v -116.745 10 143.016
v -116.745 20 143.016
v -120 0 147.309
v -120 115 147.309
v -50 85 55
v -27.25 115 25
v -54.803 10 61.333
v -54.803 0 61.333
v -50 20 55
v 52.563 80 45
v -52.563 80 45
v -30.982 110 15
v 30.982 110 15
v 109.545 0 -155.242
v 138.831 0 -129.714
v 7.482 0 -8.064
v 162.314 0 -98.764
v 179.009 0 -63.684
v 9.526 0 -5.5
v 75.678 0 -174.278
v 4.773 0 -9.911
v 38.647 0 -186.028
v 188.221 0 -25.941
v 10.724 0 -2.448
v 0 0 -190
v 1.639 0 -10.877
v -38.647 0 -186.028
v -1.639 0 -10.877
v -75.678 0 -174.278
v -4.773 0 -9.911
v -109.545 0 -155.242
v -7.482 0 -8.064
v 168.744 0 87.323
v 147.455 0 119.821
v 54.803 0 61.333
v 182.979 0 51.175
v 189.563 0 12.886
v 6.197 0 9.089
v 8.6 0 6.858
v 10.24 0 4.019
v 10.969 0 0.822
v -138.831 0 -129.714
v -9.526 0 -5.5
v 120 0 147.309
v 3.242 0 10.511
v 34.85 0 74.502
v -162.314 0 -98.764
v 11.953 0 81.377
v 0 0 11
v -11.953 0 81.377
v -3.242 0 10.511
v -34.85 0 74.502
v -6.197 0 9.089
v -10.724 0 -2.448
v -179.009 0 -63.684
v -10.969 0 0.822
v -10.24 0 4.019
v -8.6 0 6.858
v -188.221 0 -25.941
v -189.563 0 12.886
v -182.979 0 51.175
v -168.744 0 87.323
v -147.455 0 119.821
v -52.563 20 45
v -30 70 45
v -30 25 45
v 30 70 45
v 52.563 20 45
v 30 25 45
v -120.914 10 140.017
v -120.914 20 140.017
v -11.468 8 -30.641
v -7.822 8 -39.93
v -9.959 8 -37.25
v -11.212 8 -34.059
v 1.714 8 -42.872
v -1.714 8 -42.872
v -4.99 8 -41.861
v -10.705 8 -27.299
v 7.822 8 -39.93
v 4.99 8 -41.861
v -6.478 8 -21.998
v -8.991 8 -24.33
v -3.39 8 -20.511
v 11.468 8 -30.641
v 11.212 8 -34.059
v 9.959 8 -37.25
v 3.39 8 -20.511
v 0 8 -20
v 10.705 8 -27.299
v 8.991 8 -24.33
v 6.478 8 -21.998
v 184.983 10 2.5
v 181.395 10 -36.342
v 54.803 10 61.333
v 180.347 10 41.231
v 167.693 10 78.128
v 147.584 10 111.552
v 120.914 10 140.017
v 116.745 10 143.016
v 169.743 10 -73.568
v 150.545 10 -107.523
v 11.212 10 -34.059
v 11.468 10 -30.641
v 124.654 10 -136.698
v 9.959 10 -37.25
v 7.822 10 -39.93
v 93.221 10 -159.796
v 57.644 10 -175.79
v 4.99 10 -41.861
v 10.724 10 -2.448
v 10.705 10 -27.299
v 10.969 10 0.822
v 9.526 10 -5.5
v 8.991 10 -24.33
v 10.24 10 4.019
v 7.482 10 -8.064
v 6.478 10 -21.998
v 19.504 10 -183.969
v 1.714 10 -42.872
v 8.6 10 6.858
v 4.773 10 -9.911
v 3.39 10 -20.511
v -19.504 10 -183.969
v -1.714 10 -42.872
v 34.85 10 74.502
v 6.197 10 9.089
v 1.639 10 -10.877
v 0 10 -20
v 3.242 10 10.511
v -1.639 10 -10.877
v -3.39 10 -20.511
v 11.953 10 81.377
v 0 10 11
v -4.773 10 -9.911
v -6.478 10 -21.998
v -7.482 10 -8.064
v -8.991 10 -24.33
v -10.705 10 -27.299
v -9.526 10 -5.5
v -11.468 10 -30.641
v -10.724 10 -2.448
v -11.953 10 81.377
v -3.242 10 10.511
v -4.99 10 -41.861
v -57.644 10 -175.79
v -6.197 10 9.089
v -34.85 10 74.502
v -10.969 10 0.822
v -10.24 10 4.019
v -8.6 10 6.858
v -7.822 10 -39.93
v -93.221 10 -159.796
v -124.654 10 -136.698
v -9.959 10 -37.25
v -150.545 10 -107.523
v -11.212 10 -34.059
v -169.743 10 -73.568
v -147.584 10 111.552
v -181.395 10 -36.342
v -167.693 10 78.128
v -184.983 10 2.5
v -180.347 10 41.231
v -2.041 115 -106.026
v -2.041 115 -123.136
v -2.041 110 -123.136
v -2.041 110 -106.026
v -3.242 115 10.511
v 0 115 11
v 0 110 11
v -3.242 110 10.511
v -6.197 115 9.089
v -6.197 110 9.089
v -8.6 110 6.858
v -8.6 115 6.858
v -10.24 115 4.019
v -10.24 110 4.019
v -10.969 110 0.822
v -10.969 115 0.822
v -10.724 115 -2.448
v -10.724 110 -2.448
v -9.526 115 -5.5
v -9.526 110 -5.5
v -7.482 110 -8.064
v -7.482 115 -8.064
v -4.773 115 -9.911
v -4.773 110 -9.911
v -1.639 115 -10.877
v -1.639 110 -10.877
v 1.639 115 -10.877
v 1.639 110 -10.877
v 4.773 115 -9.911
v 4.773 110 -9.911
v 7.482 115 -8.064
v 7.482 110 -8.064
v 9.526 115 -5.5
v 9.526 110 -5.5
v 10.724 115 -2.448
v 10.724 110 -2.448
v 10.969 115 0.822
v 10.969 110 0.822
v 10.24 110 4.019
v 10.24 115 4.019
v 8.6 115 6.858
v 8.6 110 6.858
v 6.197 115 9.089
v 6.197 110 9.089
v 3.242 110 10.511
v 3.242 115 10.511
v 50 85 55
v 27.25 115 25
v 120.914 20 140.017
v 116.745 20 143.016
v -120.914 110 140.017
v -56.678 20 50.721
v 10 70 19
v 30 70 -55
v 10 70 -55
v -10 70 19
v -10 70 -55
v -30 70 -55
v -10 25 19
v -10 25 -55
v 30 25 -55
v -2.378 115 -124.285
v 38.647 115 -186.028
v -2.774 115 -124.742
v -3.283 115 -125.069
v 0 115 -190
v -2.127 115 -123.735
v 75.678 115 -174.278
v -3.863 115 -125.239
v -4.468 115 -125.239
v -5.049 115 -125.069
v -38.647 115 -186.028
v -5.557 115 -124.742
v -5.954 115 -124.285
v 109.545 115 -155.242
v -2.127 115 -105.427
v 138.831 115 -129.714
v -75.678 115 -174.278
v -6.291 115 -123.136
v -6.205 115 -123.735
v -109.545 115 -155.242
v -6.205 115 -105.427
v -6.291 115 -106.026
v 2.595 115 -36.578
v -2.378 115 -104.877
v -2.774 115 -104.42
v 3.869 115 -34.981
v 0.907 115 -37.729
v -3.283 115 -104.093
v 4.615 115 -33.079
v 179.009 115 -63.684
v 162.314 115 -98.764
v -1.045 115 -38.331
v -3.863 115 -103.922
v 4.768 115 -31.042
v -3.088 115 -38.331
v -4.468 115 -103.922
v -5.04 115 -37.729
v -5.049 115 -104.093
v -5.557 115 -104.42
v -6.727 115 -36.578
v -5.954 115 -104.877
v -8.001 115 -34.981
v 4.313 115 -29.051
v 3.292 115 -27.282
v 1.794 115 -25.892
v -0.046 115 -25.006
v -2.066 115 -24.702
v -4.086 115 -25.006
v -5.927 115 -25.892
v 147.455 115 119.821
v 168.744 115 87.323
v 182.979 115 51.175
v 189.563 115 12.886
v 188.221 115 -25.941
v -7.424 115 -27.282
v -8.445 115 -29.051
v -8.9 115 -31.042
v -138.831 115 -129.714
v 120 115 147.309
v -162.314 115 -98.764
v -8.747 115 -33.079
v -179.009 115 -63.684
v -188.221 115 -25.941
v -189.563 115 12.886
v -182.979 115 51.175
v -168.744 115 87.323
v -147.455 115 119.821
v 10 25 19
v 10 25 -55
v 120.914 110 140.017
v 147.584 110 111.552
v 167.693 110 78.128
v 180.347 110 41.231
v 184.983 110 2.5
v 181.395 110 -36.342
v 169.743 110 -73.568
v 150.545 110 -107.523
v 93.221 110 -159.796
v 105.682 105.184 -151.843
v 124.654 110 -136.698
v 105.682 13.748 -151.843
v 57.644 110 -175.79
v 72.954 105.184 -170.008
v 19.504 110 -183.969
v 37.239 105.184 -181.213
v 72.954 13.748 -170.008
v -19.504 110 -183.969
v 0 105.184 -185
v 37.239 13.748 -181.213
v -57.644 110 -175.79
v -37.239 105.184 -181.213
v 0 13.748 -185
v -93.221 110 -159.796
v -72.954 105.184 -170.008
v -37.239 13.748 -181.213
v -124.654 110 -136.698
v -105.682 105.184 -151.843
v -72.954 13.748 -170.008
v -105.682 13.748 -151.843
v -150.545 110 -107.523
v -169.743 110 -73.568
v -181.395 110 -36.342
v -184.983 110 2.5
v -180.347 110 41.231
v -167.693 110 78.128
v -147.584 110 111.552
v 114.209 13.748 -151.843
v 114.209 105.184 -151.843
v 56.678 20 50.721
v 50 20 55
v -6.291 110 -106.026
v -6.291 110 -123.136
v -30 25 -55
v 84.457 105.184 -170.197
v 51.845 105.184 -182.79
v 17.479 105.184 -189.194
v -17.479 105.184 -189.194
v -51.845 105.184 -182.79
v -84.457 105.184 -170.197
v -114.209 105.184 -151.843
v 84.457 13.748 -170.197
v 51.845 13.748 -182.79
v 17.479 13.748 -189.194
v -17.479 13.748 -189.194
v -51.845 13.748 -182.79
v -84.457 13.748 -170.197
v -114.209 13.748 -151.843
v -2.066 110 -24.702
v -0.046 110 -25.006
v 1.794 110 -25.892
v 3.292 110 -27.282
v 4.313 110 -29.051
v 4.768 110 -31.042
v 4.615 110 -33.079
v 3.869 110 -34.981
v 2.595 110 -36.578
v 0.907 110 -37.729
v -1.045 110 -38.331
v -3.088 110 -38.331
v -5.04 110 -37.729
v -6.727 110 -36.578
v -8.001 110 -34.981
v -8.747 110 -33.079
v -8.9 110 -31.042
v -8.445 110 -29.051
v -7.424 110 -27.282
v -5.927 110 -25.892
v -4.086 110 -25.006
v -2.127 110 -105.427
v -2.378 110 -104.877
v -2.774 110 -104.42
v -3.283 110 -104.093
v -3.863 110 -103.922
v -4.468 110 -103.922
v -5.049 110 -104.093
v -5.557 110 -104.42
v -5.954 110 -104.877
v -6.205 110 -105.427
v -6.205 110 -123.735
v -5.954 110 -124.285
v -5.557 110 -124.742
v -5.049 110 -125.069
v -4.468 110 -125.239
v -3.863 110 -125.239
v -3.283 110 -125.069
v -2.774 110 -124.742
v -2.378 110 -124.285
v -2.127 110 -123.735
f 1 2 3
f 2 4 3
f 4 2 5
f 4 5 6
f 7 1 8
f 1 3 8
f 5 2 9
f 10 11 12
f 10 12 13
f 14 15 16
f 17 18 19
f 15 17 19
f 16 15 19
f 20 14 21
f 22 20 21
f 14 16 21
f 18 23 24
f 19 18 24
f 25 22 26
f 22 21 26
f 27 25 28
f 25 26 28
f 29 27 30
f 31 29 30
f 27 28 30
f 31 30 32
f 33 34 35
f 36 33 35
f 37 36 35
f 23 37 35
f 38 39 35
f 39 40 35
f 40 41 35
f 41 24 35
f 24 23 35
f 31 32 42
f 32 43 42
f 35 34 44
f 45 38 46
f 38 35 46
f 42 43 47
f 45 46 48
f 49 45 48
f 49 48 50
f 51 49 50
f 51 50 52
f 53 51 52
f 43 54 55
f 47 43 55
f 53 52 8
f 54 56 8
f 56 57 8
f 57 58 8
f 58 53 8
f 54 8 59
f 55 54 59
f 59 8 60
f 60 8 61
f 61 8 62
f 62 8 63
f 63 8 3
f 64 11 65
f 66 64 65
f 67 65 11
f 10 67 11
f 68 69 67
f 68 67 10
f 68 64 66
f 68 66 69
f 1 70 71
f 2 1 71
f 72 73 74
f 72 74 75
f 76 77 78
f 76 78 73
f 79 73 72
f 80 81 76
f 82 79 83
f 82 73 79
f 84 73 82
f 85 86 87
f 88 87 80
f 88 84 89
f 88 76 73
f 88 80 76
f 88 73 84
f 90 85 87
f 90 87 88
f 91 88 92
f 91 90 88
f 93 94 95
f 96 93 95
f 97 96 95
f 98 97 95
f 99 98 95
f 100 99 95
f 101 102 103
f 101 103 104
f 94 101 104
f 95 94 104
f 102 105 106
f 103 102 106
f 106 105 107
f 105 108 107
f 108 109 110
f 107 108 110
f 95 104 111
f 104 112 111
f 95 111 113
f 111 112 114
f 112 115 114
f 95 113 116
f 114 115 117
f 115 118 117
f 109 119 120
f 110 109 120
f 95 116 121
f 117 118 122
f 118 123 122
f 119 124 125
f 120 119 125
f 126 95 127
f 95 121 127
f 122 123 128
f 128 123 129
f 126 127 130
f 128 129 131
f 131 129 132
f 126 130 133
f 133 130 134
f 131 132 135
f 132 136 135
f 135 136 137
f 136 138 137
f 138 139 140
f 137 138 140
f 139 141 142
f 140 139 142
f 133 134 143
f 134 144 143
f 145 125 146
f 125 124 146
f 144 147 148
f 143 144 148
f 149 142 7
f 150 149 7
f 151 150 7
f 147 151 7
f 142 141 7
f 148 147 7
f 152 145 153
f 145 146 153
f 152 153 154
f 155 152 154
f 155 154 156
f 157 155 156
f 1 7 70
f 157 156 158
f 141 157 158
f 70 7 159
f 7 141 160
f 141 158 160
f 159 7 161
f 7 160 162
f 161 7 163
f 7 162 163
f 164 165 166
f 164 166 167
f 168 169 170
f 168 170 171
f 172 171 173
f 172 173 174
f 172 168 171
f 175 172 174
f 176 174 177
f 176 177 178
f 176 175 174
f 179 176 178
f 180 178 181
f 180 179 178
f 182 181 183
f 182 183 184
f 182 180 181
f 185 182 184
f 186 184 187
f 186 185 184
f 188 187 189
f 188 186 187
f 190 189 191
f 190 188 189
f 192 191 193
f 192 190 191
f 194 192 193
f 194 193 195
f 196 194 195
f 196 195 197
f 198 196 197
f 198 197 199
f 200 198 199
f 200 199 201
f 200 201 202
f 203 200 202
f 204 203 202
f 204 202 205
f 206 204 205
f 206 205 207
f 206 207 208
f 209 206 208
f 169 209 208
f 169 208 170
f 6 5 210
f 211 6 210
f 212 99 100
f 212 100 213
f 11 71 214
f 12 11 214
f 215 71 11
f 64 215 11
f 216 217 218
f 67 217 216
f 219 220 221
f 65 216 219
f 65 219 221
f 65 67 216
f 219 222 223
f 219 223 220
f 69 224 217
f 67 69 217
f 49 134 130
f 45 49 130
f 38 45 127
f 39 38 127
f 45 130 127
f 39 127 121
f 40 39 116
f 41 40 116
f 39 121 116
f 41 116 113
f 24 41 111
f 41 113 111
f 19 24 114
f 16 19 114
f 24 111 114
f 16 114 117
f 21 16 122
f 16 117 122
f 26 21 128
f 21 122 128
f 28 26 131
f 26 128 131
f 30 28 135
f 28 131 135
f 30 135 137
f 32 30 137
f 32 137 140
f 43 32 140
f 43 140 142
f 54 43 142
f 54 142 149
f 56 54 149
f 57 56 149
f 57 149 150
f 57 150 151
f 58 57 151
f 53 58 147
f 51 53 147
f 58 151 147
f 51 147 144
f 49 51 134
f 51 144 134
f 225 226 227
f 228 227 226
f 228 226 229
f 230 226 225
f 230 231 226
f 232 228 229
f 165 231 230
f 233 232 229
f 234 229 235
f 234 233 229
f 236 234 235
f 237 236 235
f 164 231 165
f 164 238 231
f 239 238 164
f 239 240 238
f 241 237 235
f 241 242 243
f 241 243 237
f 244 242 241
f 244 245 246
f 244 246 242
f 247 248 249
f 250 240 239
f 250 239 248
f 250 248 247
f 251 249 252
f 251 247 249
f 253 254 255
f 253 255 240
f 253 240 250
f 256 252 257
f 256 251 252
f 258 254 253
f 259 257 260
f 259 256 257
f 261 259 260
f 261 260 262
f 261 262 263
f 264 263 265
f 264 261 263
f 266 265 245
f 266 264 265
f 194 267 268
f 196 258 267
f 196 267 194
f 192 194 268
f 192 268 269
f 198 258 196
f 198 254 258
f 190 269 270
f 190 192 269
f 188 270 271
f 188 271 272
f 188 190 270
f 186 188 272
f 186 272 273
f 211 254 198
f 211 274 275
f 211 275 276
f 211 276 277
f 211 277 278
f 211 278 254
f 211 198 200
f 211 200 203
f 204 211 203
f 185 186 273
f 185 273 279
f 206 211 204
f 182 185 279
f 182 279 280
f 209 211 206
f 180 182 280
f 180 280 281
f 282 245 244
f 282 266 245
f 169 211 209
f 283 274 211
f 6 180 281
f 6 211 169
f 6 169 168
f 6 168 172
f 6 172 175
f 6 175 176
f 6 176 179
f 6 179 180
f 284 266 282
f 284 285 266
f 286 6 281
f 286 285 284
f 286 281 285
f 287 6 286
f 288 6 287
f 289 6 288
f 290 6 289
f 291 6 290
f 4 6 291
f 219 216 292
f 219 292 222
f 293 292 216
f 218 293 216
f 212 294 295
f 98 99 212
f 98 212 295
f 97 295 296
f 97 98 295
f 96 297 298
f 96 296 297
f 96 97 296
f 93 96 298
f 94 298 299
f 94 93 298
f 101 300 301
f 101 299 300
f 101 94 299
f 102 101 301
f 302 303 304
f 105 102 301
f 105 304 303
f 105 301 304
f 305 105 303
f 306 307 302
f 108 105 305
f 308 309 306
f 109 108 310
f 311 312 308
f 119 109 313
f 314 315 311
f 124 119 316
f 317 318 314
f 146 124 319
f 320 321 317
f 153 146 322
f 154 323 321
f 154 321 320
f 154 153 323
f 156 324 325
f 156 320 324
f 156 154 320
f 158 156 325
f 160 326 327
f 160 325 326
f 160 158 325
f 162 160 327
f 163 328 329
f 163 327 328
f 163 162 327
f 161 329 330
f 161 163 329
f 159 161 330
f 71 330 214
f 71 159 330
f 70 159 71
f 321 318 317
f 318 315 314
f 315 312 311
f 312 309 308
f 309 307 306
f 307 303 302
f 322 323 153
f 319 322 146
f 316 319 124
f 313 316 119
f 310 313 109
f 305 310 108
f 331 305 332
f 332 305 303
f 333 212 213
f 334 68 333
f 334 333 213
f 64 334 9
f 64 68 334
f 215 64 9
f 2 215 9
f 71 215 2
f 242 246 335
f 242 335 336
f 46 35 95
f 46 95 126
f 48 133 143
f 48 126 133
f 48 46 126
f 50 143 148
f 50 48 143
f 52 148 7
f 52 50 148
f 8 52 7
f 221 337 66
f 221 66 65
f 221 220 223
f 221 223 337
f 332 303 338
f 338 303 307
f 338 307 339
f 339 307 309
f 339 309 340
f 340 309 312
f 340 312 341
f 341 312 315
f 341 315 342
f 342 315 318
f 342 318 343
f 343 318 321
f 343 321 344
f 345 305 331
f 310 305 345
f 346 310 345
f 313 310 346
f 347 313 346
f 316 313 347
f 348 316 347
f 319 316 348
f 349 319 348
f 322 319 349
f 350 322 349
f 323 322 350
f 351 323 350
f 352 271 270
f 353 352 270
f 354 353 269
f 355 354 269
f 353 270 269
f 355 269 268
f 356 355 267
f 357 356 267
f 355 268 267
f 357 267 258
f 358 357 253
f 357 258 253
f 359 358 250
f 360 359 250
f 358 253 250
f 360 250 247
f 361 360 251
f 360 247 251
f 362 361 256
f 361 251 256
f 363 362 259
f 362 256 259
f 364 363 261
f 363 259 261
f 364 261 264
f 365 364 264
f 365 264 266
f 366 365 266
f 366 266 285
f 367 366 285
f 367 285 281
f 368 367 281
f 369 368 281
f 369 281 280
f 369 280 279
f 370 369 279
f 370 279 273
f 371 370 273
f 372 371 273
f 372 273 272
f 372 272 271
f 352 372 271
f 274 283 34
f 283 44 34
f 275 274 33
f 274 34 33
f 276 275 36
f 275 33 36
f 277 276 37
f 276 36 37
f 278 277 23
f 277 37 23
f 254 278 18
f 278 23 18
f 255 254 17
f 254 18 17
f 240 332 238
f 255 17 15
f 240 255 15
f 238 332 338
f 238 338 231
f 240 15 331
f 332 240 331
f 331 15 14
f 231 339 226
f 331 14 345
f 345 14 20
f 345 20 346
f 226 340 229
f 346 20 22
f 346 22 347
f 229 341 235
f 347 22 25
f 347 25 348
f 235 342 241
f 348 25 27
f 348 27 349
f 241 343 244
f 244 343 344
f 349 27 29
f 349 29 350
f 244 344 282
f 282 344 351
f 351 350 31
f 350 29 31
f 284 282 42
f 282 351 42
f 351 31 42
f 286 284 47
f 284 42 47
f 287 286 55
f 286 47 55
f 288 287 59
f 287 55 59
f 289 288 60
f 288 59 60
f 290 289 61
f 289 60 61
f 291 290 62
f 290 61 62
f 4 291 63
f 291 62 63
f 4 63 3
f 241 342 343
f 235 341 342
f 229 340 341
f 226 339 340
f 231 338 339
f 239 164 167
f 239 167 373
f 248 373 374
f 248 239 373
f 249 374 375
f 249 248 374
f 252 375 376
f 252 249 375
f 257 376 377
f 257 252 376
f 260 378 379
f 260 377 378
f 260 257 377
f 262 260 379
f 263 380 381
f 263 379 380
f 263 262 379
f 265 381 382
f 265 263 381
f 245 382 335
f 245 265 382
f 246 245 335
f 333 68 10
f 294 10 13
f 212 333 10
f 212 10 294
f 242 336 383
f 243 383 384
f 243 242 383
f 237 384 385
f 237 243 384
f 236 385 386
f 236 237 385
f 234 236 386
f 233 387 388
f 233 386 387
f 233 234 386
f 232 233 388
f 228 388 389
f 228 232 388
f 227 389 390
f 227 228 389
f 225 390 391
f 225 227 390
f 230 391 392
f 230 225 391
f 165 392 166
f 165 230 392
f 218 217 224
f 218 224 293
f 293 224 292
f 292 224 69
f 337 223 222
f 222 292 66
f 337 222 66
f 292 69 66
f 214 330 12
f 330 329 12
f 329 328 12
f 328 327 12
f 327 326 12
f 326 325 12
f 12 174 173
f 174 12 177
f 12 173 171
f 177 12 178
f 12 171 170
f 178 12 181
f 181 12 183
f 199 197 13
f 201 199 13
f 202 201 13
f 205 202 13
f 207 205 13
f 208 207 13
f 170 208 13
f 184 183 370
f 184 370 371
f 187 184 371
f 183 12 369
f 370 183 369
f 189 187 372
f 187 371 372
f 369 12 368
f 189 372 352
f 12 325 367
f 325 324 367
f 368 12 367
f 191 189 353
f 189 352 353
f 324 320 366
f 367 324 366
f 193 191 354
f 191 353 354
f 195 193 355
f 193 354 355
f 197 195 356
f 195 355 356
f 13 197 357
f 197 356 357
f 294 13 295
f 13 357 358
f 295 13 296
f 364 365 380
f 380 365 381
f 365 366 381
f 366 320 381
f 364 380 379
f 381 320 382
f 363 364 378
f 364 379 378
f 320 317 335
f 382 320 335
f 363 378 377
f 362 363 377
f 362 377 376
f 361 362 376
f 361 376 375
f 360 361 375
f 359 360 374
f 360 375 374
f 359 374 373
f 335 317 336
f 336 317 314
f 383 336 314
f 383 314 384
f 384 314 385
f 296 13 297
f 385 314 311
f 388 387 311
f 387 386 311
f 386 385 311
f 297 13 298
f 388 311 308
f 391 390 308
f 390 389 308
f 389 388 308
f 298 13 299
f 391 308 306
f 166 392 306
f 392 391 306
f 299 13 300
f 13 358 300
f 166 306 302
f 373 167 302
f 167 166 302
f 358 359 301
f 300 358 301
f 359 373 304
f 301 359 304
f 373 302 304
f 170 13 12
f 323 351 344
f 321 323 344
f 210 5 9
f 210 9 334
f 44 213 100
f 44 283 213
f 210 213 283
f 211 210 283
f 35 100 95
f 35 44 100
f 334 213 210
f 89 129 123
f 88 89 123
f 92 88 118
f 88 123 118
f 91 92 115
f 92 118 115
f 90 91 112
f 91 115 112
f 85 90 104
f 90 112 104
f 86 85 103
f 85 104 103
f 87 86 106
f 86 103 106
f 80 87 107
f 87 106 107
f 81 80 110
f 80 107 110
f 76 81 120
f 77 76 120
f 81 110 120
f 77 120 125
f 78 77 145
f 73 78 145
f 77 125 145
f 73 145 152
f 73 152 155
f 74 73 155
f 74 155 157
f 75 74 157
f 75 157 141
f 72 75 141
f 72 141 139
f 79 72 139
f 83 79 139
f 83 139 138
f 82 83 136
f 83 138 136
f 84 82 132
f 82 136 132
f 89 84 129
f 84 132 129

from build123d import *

# Parameters (mm, degrees)
SKETCH_1_R                = 190
EXTRUDE_1_DEPTH           = 10
SKETCH_2_R                = 11
CUT_EXTRUDE_1_DEPTH       = 10
CUT_EXTRUDE_2_DEPTH       = 10
CUT_EXTRUDE_3_DEPTH       = 10
SKETCH_5_R                = 11.5
CUT_EXTRUDE_4_DEPTH       = 2
EXTRUDE_2_DEPTH           = 100
EXTRUDE_3_DEPTH           = 5
CUT_EXTRUDE_START         = -5
SKETCH_11_R               = 11
CUT_EXTRUDE_7_DEPTH       = 5
SKETCH_12_W               = 100
SKETCH_12_H               = 115
EXTRUDE_4_DEPTH           = 5
EXTRUDE_5_DEPTH           = 115
CUT_EXTRUDE_8_DEPTH       = 289.487434735
SKETCH_15_W               = 110
SKETCH_15_H               = 10
CUT_EXTRUDE_9_DEPTH       = 23
SKETCH_16_W               = 110
SKETCH_16_H               = 10
CUT_EXTRUDE_10_DEPTH      = 23
EXTRUDE_6_DEPTH           = 10
SKETCH_18_R               = 10
EXTRUDE_7_DEPTH           = 100
SKETCH_20_W               = 40.15762627
SKETCH_20_H               = 37.957208392
EXTRUDE_8_DEPTH           = 20
CUT_EXTRUDE_11_DEPTH      = 70
SKETCH_22_W               = 6
SKETCH_22_H               = 39.800206828
SKETCH_24_R               = 10.715541735
EXTRUDE_9_DEPTH           = 50
SKETCH_25_R               = 8.111462828
CUT_EXTRUDE_13_DEPTH      = 1
FILLET_2_R                = 3
SKETCH_26_W               = 20.914862296
SKETCH_26_H               = 66.390296829
CUT_EXTRUDE_14_DEPTH      = 41
EXTRUDE_START             = -5
EXTRUDE_10_DEPTH          = 5
CUT_EXTRUDE_15_DEPTH      = 369.496652909
CUT_EXTRUDE_15_DEPTH_BACK = 369.496652909
SKETCH_28_W               = 81.996426071
SKETCH_28_H               = 91.436240801
EXTRUDE_11_DEPTH          = 142
SKETCH_30_W               = 61.807944975
SKETCH_30_H               = 65.134221846
EXTRUDE_12_DEPTH          = 5
FILLET_4_R                = 13
SKETCH_31_W               = 61.807944975
SKETCH_31_H               = 147
EXTRUDE_13_DEPTH          = 70
SKETCH_32_W               = 51.807944975
SKETCH_32_H               = 142
CUT_EXTRUDE_16_DEPTH      = 60
FILLET_5_R                = 13
FILLET_6_R                = 13
CUT_EXTRUDE_17_DEPTH      = 60
CUT_EXTRUDE_18_DEPTH      = 60
EXTRUDE_START_2           = -75
SKETCH_35_W               = 61.807944975
SKETCH_35_H               = 6.562212177
EXTRUDE_14_DEPTH          = 75
CUT_EXTRUDE_19_DEPTH      = 60
CUT_EXTRUDE_START_2       = 70
CUT_EXTRUDE_20_DEPTH      = 70
SKETCH_40_R               = 6.852948308
CUT_EXTRUDE_24_DEPTH      = 10
CHAMFER_1_SIZE            = 30
CHAMFER_2_SIZE            = 30
CUT_EXTRUDE_25_DEPTH      = 216
CUT_EXTRUDE_26_DEPTH      = 10
CUT_EXTRUDE_26_DEPTH_BACK = 20
SKETCH_42_W               = 161.925382199
SKETCH_42_H               = 10
SKETCH_43_W               = 20
SKETCH_43_H               = 45
EXTRUDE_15_DEPTH          = 100
SKETCH_44_W               = 60
SKETCH_44_H               = 45
EXTRUDE_16_DEPTH          = 26


# Read off the part's stored shape, not the designer's step: 圆顶1
with BuildPart() as part:
    # 草图1 → 凸台-拉伸1 (new body)
    with BuildSketch(Plane(origin=(0, 0, 0), x_dir=(1, 0, 0), z_dir=(0, 1, 0))):
        with Locations(Location((0, 0, 0), (0, 0, 270))):
            Circle(SKETCH_1_R)
    extrude(amount=EXTRUDE_1_DEPTH)

    # 草图2 → 切除-拉伸1 (cut)
    with BuildSketch(Plane(origin=(0, 10, 0), x_dir=(1, 0, 0), z_dir=(0, 1, 0))):
        with Locations(Location((0, 0, 0), (0, 0, 270))):
            Circle(SKETCH_2_R)
    extrude(amount=-CUT_EXTRUDE_1_DEPTH, mode=Mode.SUBTRACT)

    # 草图3 → 切除-拉伸2 (cut)
    with BuildSketch(Plane(origin=(0, 10, 0), x_dir=(1, 0, 0), z_dir=(0, 1, 0))):
        Polygon((-50, -50), (-120, -147.309198627), (120, -147.309198627), (50, -50), align=None)
    extrude(amount=-CUT_EXTRUDE_2_DEPTH, mode=Mode.SUBTRACT)

    # 草图4 → 切除-拉伸3 (cut)
    with BuildSketch(Plane(origin=(0, 10, 0), x_dir=(1, 0, 0), z_dir=(0, 1, 0))):
        Polygon((50, -50), (136.06201209, -169.637506124), (-54.476164161, -215.928987862), (-150.534220248, -169.637506124), (-120, -147.309198627), (-80.889727825, -92.940780863), align=None)
    extrude(amount=-CUT_EXTRUDE_3_DEPTH, mode=Mode.SUBTRACT)

    # 草图5 → 切除-拉伸4 (cut)
    with BuildSketch(Plane(origin=(0, 10, 0), x_dir=(1, 0, 0), z_dir=(0, 1, 0))):
        with Locations(Location((0, 31.5, 0), (0, 0, 270))):
            Circle(SKETCH_5_R)
    extrude(amount=-CUT_EXTRUDE_4_DEPTH, mode=Mode.SUBTRACT)

    # 草图9 → 凸台-拉伸2 (add)
    with BuildSketch(Plane(origin=(0, 10, 0), x_dir=(1, 0, 0), z_dir=(0, 1, 0))):
        with BuildLine():
            Line((50, -50), (120, -147.309198627))
            ThreePointArc((120, -147.309198627), (0, 190), (-120, -147.309198627))
            Line((-120, -147.309198627), (-50, -50))
            Line((-50, -50), (50, -50))
        make_face()
        with BuildLine():
            Line((52.56250687, -45), (120.913822869, -140.017311213))
            ThreePointArc((120.913822869, -140.017311213), (0, 185), (-120.913822869, -140.017311213))
            Line((-120.913822869, -140.017311213), (-52.56250687, -45))
            Line((-52.56250687, -45), (52.56250687, -45))
        make_face(mode=Mode.SUBTRACT)
    extrude(amount=EXTRUDE_2_DEPTH)

    # 草图10 → 凸台-拉伸3 (add)
    with BuildSketch(Plane(origin=(0, 110, 0), x_dir=(1, 0, 0), z_dir=(0, 1, 0))):
        with BuildLine():
            Line((-50, -50), (50, -50))
            Line((50, -50), (120, -147.309198627))
            ThreePointArc((120, -147.309198627), (0, 190), (-120, -147.309198627))
            Line((-120, -147.309198627), (-50, -50))
        make_face()
    extrude(amount=EXTRUDE_3_DEPTH)

    # 草图11 → 切除-拉伸7 (cut)
    with BuildSketch(Plane.XZ.offset(-110).offset(CUT_EXTRUDE_START)):
        with Locations(Location((0, 0, 0), (0, 0, 90))):
            Circle(SKETCH_11_R)
    extrude(amount=CUT_EXTRUDE_7_DEPTH, mode=Mode.SUBTRACT)

    # 草图12 → 凸台-拉伸4 (add)
    with BuildSketch(Plane.XY.offset(50)):
        with Locations((0, 57.5)):
            Rectangle(SKETCH_12_W, SKETCH_12_H)
    extrude(amount=EXTRUDE_4_DEPTH)

    # 草图13 → 凸台-拉伸5 (add)
    with BuildSketch(Plane.XZ):
        Polygon((-120, 147.309198627), (-50, 55), (-50, 50), align=None)
        Polygon((50, 50), (120, 147.309198627), (50, 55), align=None)
    extrude(amount=-EXTRUDE_5_DEPTH)

    # 草图14 → 切除-拉伸8 (cut, through all)
    with BuildSketch(Plane(origin=(0, 10, 0), x_dir=(1, 0, 0), z_dir=(0, 1, 0))):
        with BuildLine():
            Line((-175, 60), (175, 60))
            ThreePointArc((175, 60), (0, 185), (-175, 60))
        make_face()
    extrude(amount=CUT_EXTRUDE_8_DEPTH, mode=Mode.SUBTRACT)

    # 草图15 → 切除-拉伸9 (cut)
    with BuildSketch(Plane(origin=(-13.305974514, 0, -9.571738635), x_dir=(-0.5839606140594331, 0, 0.8117819911942675), z_dir=(-0.8117819911942675, 0, -0.5839606140594331))):
        with Locations((129.272441949, 15)):
            Rectangle(SKETCH_15_W, SKETCH_15_H)
    extrude(amount=-CUT_EXTRUDE_9_DEPTH, mode=Mode.SUBTRACT)

    # 草图16 → 切除-拉伸10 (cut)
    with BuildSketch(Plane(origin=(13.305974514, 0, -9.571738635), x_dir=(-0.5839606140594333, 0, -0.8117819911942674), z_dir=(0.8117819911942673, 0, -0.5839606140594332))):
        with Locations((-129.272441949, 15)):
            Rectangle(SKETCH_16_W, SKETCH_16_H)
    extrude(amount=-CUT_EXTRUDE_10_DEPTH, mode=Mode.SUBTRACT)

    # 草图17 → 凸台-拉伸6 (add)
    with BuildSketch(Plane.XZ):
        with BuildLine():
            Line((-68.721971502, 45.192401274), (70.16486598, 42.91799252))
            ThreePointArc((70.16486598, 42.91799252), (1.34674419, 82.238973608), (-68.721971502, 45.192401274))
        make_face()
    extrude(amount=-EXTRUDE_6_DEPTH)

    # 草图18 → 凸台-拉伸7 (add)
    with BuildSketch(Plane(origin=(0, 115, 0), x_dir=(1, 0, 0), z_dir=(0, 1, 0))):
        with Locations(Location((0, 46.854928923, 0), (0, 0, 90))):
            Circle(SKETCH_18_R)
    extrude(amount=EXTRUDE_7_DEPTH)

    # 草图20 → 凸台-拉伸8 (add)
    with BuildSketch(Plane(origin=(0, 215, 0), x_dir=(1, 0, 0), z_dir=(0, 1, 0))):
        with Locations((-0.847426087, 46.622471939)):
            Rectangle(SKETCH_20_W, SKETCH_20_H)
    extrude(amount=EXTRUDE_8_DEPTH)

    # 草图21 → 切除-拉伸11 (cut)
    with BuildSketch(Plane.ZY.offset(20.926239222)):
        Polygon((-54.791741718, 236.72389037), (-19.944006341, 217.982251176), (-19.065492004, 240.530785832), align=None)
    extrude(amount=-CUT_EXTRUDE_11_DEPTH, mode=Mode.SUBTRACT)

    # 草图22 → 旋转1 (revolve)
    with BuildSketch(Plane(origin=(0, 160.757687824, 86.457916141), x_dir=(1, 0, 0), z_dir=(0, 0.8807086333026608, 0.4736584246333635)), mode=Mode.PRIVATE) as revolve_1_sk:
        with Locations((1.240539722, 142.968257651)):
            Rectangle(SKETCH_22_W, SKETCH_22_H)
    revolve(revolve_1_sk.sketch.rotate(Axis((-1.759460278, 237.901659149, -56.981655541), (0, -0.47365842463336366, 0.8807086333026606)), 90), axis=Axis((-1.759460278, 237.901659149, -56.981655541), (0, -0.47365842463336366, 0.8807086333026606)))

    # 草图24 → 凸台-拉伸9 (add)
    with BuildSketch(Plane(origin=(0, 58.292268059, -108.387185922), x_dir=(1, 0, 0), z_dir=(0, -0.4736584246333635, 0.8807086333026606))):
        with Locations(Location((-1.759460278, 182.532203893, 0), (0, 0, 270))):
            Circle(SKETCH_24_R)
    extrude(amount=-EXTRUDE_9_DEPTH)

    # 草图25 → 切除-拉伸13 (cut)
    with BuildSketch(Plane(origin=(0, 58.292268059, -108.387185922), x_dir=(1, 0, 0), z_dir=(0, -0.4736584246333635, 0.8807086333026606))):
        with Locations(Location((-1.759460278, 182.532203893, 0), (0, 0, 270))):
            Circle(SKETCH_25_R)
    extrude(amount=-CUT_EXTRUDE_13_DEPTH, mode=Mode.SUBTRACT)

    # 圆角2
    fillet_2_edges = [part.edges().sort_by_distance(p)[0] for p in [
        (0, 115, -36.854928923),
    ]]
    fillet(fillet_2_edges, radius=FILLET_2_R)

    # 草图26 → 切除-拉伸14 (cut)
    with BuildSketch(Plane(origin=(0, 160.757687824, 86.457916141), x_dir=(1, 0, 0), z_dir=(0, 0.8807086333026608, 0.4736584246333635))):
        with Locations((27.855490238, 146.001600843)):
            Rectangle(SKETCH_26_W, SKETCH_26_H)
    extrude(amount=-CUT_EXTRUDE_14_DEPTH, mode=Mode.SUBTRACT)

    # 草图27 → 凸台-拉伸10 (add)
    with BuildSketch(Plane(origin=(0, 115, 0), x_dir=(1, 0, 0), z_dir=(0, 1, 0)).offset(EXTRUDE_START)):
        with BuildLine():
            Line((-175, 60), (175, 60))
            ThreePointArc((175, 60), (0, 185), (-175, 60))
        make_face()
    extrude(amount=EXTRUDE_10_DEPTH)

    # 草图28 → 切除-拉伸15 (cut, two sides: drawn at the far end of the back side and taken through both)
    with BuildSketch(Plane(origin=(0, 0, 0), x_dir=(0, 0, -1), z_dir=(1, 0, 0)).offset(-CUT_EXTRUDE_15_DEPTH_BACK)):
        with Locations((192.841193776, 59.465903433)):
            Rectangle(SKETCH_28_W, SKETCH_28_H)
    extrude(amount=CUT_EXTRUDE_15_DEPTH + CUT_EXTRUDE_15_DEPTH_BACK, mode=Mode.SUBTRACT)

    # 草图29 → 凸台-拉伸11 (add)
    with BuildSketch(Plane(origin=(0, 115, 0), x_dir=(1, 0, 0), z_dir=(0, 1, 0))):
        Polygon((-32.985541705, 83.704196909), (-32.985541705, 18.569975063), (-27.985541705, 18.569975063), (-27.985541705, 78.704196909), (23.82240327, 78.704196909), (23.82240327, 18.569975063), (28.82240327, 18.569975063), (28.82240327, 83.704196909), align=None)
    extrude(amount=EXTRUDE_11_DEPTH)

    # 草图30 → 凸台-拉伸12 (add)
    with BuildSketch(Plane(origin=(0, 257, 0), x_dir=(1, 0, 0), z_dir=(0, 1, 0))):
        with Locations((-2.081569218, 51.137085986)):
            Rectangle(SKETCH_30_W, SKETCH_30_H)
    extrude(amount=EXTRUDE_12_DEPTH)

    # 圆角4
    fillet_4_edges = [part.edges().sort_by_distance(p)[0] for p in [
        (-27.985541705, 257, -48.637085986),
        (23.82240327, 257, -48.637085986),
    ]]
    fillet(fillet_4_edges, radius=FILLET_4_R)

    # 草图31 → 凸台-拉伸13 (add)
    with BuildSketch(Plane(origin=(0, 0, -83.704196909), x_dir=(-1, 0, 0), z_dir=(0, 0, -1))):
        with Locations((2.081569218, 188.5)):
            Rectangle(SKETCH_31_W, SKETCH_31_H)
    extrude(amount=EXTRUDE_13_DEPTH)

    # 草图32 → 切除-拉伸16 (cut)
    with BuildSketch(Plane(origin=(0, 0, -153.704196909), x_dir=(-1, 0, 0), z_dir=(0, 0, -1))):
        with Locations((2.081569218, 186)):
            Rectangle(SKETCH_32_W, SKETCH_32_H)
    extrude(amount=-CUT_EXTRUDE_16_DEPTH, mode=Mode.SUBTRACT)

    # 圆角5
    fillet_5_edges = [part.edges().sort_by_distance(p)[0] for p in [
        (-32.985541705, 262, -86.137085986),
        (28.82240327, 262, -86.137085986),
    ]]
    fillet(fillet_5_edges, radius=FILLET_5_R)

    # 圆角6
    fillet_6_edges = [part.edges().sort_by_distance(p)[0] for p in [
        (23.82240327, 257, -123.704196909),
        (-27.985541705, 257, -123.704196909),
    ]]
    fillet(fillet_6_edges, radius=FILLET_6_R)

    # 草图33 → 切除-拉伸17 (cut)
    with BuildSketch(Plane.XY.offset(-78.704196909)):
        with BuildLine():
            Line((13.892318938, 199.249147057), (13.892318938, 143.139086494))
            ThreePointArc((13.892318938, 143.139086494), (0, 129.246767556), (-13.892318938, 143.139086494))
            Line((-13.892318938, 143.139086494), (-13.892318938, 199.249147057))
            ThreePointArc((-13.892318938, 199.249147057), (0, 213.141465996), (13.892318938, 199.249147057))
        make_face()
    extrude(amount=-CUT_EXTRUDE_17_DEPTH, mode=Mode.SUBTRACT)

    # 草图34 → 切除-拉伸18 (cut)
    with BuildSketch(Plane(origin=(0, 115, 0), x_dir=(1, 0, 0), z_dir=(0, 1, 0))):
        with BuildLine():
            Line((-6.290976551, 106.02597296), (-6.290976551, 123.135910488))
            ThreePointArc((-6.290976551, 123.135910488), (-4.165768662, 125.261118376), (-2.040560774, 123.135910488))
            Line((-2.040560774, 123.135910488), (-2.040560774, 106.02597296))
            ThreePointArc((-2.040560774, 106.02597296), (-4.165768662, 103.900765071), (-6.290976551, 106.02597296))
        make_face()
    extrude(amount=-CUT_EXTRUDE_18_DEPTH, mode=Mode.SUBTRACT)

    # 草图35 → 凸台-拉伸14 (add)
    with BuildSketch(Plane(origin=(0, 0, -153.704196909), x_dir=(-1, 0, 0), z_dir=(0, 0, -1)).offset(EXTRUDE_START_2)):
        with Locations((2.081569218, 185.281106088)):
            Rectangle(SKETCH_35_W, SKETCH_35_H)
    extrude(amount=EXTRUDE_14_DEPTH)

    # 草图36 → 切除-拉伸19 (cut)
    with BuildSketch(Plane(origin=(0, 188.562212177, 0), x_dir=(1, 0, 0), z_dir=(0, 1, 0))):
        with BuildLine():
            Line((-6.290976551, 123.135910488), (-6.290976551, 106.02597296))
            ThreePointArc((-6.290976551, 106.02597296), (-4.165768662, 103.900765071), (-2.040560774, 106.02597296))
            Line((-2.040560774, 106.02597296), (-2.040560774, 123.135910488))
            ThreePointArc((-2.040560774, 123.135910488), (-4.165768662, 125.261118376), (-6.290976551, 123.135910488))
        make_face()
    extrude(amount=-CUT_EXTRUDE_19_DEPTH, mode=Mode.SUBTRACT)

    # 圆顶1 outline → 圆顶1 (revolve)
    with BuildSketch(Plane(origin=(-1.759460278, 160.757687824, 86.457916141), x_dir=(1, 0, 0), z_dir=(0, 0.880708633302661, 0.473658424633363))):
        with BuildLine():
            Line((0, 124.068154246), (0, 119.068154237))
            ThreePointArc((0, 119.068154237), (4.764342278, 120.41858011), (8.111462832, 124.068154246))
            Line((8.111462832, 124.068154246), (0, 124.068154246))
        make_face()
    revolve(axis=Axis((-1.759460278, 160.757687824, 86.457916141), (0, 0.473658424633363, -0.880708633302661)))

    # 草图37 → 切除-拉伸20 (cut)
    with BuildSketch(Plane.XY.offset(-78.704196909).offset(CUT_EXTRUDE_START_2)):
        with BuildLine():
            Line((-27.985541705, 115), (23.82240327, 115))
            Line((23.82240327, 115), (23.82240327, 244))
            ThreePointArc((23.82240327, 244), (20.014791425, 253.192388155), (10.82240327, 257))
            Line((10.82240327, 257), (-14.985541705, 257))
            ThreePointArc((-14.985541705, 257), (-24.177929861, 253.192388155), (-27.985541705, 244))
            Line((-27.985541705, 244), (-27.985541705, 115))
        make_face()
    extrude(amount=-CUT_EXTRUDE_20_DEPTH, mode=Mode.SUBTRACT)

    # 草图40 → 切除-拉伸24 (cut)
    with BuildSketch(Plane(origin=(0, 115, 0), x_dir=(1, 0, 0), z_dir=(0, 1, 0))):
        with Locations(Location((-2.06616942, 31.55452141, 0), (0, 0, 270))):
            Circle(SKETCH_40_R)
    extrude(amount=-CUT_EXTRUDE_24_DEPTH, mode=Mode.SUBTRACT)

    # 倒角1
    chamfer_1_edges = [part.edges().sort_by_distance(p)[0] for p in [
        (0, 115, 55),
    ]]
    chamfer(chamfer_1_edges, length=CHAMFER_1_SIZE)

    # 倒角2
    chamfer_2_edges = [part.edges().sort_by_distance(p)[0] for p in [
        (0, 110, 45),
    ]]
    chamfer(chamfer_2_edges, length=CHAMFER_2_SIZE)

    # 草图41 → 切除-拉伸25 (cut)
    with BuildSketch(Plane(origin=(0, 115, 0), x_dir=(1, 0, 0), z_dir=(0, 1, 0))):
        with BuildLine():
            Line((-120, -147.309198627), (-27.250371239, -25))
            Line((-27.250371239, -25), (27.250371239, -25))
            Line((27.250371239, -25), (120, -147.309198627))
            ThreePointArc((120, -147.309198627), (0, 190), (-120, -147.309198627))
        make_face()
    extrude(amount=CUT_EXTRUDE_25_DEPTH, mode=Mode.SUBTRACT)

    # 草图42 → 切除-拉伸26 (cut, two sides: drawn at the far end of the back side and taken through both)
    with BuildSketch(Plane.XY.offset(55).offset(-CUT_EXTRUDE_26_DEPTH_BACK)):
        with Locations((4.31271157, 15)):
            Rectangle(SKETCH_42_W, SKETCH_42_H)
    extrude(amount=CUT_EXTRUDE_26_DEPTH + CUT_EXTRUDE_26_DEPTH_BACK, mode=Mode.SUBTRACT)

    # 草图43 → 凸台-拉伸15 (add)
    with BuildSketch(Plane(origin=(0, 0, 45), x_dir=(-1, 0, 0), z_dir=(0, 0, -1))):
        with Locations((-20, 47.5)):
            Rectangle(SKETCH_43_W, SKETCH_43_H)
        with Locations((20, 47.5)):
            Rectangle(SKETCH_43_W, SKETCH_43_H)
    extrude(amount=EXTRUDE_15_DEPTH)

    # 草图44 → 凸台-拉伸16 (add)
    with BuildSketch(Plane(origin=(0, 0, 45), x_dir=(-1, 0, 0), z_dir=(0, 0, -1))):
        with Locations((0, 47.5)):
            Rectangle(SKETCH_44_W, SKETCH_44_H)
    extrude(amount=EXTRUDE_16_DEPTH)


solid = part.part
